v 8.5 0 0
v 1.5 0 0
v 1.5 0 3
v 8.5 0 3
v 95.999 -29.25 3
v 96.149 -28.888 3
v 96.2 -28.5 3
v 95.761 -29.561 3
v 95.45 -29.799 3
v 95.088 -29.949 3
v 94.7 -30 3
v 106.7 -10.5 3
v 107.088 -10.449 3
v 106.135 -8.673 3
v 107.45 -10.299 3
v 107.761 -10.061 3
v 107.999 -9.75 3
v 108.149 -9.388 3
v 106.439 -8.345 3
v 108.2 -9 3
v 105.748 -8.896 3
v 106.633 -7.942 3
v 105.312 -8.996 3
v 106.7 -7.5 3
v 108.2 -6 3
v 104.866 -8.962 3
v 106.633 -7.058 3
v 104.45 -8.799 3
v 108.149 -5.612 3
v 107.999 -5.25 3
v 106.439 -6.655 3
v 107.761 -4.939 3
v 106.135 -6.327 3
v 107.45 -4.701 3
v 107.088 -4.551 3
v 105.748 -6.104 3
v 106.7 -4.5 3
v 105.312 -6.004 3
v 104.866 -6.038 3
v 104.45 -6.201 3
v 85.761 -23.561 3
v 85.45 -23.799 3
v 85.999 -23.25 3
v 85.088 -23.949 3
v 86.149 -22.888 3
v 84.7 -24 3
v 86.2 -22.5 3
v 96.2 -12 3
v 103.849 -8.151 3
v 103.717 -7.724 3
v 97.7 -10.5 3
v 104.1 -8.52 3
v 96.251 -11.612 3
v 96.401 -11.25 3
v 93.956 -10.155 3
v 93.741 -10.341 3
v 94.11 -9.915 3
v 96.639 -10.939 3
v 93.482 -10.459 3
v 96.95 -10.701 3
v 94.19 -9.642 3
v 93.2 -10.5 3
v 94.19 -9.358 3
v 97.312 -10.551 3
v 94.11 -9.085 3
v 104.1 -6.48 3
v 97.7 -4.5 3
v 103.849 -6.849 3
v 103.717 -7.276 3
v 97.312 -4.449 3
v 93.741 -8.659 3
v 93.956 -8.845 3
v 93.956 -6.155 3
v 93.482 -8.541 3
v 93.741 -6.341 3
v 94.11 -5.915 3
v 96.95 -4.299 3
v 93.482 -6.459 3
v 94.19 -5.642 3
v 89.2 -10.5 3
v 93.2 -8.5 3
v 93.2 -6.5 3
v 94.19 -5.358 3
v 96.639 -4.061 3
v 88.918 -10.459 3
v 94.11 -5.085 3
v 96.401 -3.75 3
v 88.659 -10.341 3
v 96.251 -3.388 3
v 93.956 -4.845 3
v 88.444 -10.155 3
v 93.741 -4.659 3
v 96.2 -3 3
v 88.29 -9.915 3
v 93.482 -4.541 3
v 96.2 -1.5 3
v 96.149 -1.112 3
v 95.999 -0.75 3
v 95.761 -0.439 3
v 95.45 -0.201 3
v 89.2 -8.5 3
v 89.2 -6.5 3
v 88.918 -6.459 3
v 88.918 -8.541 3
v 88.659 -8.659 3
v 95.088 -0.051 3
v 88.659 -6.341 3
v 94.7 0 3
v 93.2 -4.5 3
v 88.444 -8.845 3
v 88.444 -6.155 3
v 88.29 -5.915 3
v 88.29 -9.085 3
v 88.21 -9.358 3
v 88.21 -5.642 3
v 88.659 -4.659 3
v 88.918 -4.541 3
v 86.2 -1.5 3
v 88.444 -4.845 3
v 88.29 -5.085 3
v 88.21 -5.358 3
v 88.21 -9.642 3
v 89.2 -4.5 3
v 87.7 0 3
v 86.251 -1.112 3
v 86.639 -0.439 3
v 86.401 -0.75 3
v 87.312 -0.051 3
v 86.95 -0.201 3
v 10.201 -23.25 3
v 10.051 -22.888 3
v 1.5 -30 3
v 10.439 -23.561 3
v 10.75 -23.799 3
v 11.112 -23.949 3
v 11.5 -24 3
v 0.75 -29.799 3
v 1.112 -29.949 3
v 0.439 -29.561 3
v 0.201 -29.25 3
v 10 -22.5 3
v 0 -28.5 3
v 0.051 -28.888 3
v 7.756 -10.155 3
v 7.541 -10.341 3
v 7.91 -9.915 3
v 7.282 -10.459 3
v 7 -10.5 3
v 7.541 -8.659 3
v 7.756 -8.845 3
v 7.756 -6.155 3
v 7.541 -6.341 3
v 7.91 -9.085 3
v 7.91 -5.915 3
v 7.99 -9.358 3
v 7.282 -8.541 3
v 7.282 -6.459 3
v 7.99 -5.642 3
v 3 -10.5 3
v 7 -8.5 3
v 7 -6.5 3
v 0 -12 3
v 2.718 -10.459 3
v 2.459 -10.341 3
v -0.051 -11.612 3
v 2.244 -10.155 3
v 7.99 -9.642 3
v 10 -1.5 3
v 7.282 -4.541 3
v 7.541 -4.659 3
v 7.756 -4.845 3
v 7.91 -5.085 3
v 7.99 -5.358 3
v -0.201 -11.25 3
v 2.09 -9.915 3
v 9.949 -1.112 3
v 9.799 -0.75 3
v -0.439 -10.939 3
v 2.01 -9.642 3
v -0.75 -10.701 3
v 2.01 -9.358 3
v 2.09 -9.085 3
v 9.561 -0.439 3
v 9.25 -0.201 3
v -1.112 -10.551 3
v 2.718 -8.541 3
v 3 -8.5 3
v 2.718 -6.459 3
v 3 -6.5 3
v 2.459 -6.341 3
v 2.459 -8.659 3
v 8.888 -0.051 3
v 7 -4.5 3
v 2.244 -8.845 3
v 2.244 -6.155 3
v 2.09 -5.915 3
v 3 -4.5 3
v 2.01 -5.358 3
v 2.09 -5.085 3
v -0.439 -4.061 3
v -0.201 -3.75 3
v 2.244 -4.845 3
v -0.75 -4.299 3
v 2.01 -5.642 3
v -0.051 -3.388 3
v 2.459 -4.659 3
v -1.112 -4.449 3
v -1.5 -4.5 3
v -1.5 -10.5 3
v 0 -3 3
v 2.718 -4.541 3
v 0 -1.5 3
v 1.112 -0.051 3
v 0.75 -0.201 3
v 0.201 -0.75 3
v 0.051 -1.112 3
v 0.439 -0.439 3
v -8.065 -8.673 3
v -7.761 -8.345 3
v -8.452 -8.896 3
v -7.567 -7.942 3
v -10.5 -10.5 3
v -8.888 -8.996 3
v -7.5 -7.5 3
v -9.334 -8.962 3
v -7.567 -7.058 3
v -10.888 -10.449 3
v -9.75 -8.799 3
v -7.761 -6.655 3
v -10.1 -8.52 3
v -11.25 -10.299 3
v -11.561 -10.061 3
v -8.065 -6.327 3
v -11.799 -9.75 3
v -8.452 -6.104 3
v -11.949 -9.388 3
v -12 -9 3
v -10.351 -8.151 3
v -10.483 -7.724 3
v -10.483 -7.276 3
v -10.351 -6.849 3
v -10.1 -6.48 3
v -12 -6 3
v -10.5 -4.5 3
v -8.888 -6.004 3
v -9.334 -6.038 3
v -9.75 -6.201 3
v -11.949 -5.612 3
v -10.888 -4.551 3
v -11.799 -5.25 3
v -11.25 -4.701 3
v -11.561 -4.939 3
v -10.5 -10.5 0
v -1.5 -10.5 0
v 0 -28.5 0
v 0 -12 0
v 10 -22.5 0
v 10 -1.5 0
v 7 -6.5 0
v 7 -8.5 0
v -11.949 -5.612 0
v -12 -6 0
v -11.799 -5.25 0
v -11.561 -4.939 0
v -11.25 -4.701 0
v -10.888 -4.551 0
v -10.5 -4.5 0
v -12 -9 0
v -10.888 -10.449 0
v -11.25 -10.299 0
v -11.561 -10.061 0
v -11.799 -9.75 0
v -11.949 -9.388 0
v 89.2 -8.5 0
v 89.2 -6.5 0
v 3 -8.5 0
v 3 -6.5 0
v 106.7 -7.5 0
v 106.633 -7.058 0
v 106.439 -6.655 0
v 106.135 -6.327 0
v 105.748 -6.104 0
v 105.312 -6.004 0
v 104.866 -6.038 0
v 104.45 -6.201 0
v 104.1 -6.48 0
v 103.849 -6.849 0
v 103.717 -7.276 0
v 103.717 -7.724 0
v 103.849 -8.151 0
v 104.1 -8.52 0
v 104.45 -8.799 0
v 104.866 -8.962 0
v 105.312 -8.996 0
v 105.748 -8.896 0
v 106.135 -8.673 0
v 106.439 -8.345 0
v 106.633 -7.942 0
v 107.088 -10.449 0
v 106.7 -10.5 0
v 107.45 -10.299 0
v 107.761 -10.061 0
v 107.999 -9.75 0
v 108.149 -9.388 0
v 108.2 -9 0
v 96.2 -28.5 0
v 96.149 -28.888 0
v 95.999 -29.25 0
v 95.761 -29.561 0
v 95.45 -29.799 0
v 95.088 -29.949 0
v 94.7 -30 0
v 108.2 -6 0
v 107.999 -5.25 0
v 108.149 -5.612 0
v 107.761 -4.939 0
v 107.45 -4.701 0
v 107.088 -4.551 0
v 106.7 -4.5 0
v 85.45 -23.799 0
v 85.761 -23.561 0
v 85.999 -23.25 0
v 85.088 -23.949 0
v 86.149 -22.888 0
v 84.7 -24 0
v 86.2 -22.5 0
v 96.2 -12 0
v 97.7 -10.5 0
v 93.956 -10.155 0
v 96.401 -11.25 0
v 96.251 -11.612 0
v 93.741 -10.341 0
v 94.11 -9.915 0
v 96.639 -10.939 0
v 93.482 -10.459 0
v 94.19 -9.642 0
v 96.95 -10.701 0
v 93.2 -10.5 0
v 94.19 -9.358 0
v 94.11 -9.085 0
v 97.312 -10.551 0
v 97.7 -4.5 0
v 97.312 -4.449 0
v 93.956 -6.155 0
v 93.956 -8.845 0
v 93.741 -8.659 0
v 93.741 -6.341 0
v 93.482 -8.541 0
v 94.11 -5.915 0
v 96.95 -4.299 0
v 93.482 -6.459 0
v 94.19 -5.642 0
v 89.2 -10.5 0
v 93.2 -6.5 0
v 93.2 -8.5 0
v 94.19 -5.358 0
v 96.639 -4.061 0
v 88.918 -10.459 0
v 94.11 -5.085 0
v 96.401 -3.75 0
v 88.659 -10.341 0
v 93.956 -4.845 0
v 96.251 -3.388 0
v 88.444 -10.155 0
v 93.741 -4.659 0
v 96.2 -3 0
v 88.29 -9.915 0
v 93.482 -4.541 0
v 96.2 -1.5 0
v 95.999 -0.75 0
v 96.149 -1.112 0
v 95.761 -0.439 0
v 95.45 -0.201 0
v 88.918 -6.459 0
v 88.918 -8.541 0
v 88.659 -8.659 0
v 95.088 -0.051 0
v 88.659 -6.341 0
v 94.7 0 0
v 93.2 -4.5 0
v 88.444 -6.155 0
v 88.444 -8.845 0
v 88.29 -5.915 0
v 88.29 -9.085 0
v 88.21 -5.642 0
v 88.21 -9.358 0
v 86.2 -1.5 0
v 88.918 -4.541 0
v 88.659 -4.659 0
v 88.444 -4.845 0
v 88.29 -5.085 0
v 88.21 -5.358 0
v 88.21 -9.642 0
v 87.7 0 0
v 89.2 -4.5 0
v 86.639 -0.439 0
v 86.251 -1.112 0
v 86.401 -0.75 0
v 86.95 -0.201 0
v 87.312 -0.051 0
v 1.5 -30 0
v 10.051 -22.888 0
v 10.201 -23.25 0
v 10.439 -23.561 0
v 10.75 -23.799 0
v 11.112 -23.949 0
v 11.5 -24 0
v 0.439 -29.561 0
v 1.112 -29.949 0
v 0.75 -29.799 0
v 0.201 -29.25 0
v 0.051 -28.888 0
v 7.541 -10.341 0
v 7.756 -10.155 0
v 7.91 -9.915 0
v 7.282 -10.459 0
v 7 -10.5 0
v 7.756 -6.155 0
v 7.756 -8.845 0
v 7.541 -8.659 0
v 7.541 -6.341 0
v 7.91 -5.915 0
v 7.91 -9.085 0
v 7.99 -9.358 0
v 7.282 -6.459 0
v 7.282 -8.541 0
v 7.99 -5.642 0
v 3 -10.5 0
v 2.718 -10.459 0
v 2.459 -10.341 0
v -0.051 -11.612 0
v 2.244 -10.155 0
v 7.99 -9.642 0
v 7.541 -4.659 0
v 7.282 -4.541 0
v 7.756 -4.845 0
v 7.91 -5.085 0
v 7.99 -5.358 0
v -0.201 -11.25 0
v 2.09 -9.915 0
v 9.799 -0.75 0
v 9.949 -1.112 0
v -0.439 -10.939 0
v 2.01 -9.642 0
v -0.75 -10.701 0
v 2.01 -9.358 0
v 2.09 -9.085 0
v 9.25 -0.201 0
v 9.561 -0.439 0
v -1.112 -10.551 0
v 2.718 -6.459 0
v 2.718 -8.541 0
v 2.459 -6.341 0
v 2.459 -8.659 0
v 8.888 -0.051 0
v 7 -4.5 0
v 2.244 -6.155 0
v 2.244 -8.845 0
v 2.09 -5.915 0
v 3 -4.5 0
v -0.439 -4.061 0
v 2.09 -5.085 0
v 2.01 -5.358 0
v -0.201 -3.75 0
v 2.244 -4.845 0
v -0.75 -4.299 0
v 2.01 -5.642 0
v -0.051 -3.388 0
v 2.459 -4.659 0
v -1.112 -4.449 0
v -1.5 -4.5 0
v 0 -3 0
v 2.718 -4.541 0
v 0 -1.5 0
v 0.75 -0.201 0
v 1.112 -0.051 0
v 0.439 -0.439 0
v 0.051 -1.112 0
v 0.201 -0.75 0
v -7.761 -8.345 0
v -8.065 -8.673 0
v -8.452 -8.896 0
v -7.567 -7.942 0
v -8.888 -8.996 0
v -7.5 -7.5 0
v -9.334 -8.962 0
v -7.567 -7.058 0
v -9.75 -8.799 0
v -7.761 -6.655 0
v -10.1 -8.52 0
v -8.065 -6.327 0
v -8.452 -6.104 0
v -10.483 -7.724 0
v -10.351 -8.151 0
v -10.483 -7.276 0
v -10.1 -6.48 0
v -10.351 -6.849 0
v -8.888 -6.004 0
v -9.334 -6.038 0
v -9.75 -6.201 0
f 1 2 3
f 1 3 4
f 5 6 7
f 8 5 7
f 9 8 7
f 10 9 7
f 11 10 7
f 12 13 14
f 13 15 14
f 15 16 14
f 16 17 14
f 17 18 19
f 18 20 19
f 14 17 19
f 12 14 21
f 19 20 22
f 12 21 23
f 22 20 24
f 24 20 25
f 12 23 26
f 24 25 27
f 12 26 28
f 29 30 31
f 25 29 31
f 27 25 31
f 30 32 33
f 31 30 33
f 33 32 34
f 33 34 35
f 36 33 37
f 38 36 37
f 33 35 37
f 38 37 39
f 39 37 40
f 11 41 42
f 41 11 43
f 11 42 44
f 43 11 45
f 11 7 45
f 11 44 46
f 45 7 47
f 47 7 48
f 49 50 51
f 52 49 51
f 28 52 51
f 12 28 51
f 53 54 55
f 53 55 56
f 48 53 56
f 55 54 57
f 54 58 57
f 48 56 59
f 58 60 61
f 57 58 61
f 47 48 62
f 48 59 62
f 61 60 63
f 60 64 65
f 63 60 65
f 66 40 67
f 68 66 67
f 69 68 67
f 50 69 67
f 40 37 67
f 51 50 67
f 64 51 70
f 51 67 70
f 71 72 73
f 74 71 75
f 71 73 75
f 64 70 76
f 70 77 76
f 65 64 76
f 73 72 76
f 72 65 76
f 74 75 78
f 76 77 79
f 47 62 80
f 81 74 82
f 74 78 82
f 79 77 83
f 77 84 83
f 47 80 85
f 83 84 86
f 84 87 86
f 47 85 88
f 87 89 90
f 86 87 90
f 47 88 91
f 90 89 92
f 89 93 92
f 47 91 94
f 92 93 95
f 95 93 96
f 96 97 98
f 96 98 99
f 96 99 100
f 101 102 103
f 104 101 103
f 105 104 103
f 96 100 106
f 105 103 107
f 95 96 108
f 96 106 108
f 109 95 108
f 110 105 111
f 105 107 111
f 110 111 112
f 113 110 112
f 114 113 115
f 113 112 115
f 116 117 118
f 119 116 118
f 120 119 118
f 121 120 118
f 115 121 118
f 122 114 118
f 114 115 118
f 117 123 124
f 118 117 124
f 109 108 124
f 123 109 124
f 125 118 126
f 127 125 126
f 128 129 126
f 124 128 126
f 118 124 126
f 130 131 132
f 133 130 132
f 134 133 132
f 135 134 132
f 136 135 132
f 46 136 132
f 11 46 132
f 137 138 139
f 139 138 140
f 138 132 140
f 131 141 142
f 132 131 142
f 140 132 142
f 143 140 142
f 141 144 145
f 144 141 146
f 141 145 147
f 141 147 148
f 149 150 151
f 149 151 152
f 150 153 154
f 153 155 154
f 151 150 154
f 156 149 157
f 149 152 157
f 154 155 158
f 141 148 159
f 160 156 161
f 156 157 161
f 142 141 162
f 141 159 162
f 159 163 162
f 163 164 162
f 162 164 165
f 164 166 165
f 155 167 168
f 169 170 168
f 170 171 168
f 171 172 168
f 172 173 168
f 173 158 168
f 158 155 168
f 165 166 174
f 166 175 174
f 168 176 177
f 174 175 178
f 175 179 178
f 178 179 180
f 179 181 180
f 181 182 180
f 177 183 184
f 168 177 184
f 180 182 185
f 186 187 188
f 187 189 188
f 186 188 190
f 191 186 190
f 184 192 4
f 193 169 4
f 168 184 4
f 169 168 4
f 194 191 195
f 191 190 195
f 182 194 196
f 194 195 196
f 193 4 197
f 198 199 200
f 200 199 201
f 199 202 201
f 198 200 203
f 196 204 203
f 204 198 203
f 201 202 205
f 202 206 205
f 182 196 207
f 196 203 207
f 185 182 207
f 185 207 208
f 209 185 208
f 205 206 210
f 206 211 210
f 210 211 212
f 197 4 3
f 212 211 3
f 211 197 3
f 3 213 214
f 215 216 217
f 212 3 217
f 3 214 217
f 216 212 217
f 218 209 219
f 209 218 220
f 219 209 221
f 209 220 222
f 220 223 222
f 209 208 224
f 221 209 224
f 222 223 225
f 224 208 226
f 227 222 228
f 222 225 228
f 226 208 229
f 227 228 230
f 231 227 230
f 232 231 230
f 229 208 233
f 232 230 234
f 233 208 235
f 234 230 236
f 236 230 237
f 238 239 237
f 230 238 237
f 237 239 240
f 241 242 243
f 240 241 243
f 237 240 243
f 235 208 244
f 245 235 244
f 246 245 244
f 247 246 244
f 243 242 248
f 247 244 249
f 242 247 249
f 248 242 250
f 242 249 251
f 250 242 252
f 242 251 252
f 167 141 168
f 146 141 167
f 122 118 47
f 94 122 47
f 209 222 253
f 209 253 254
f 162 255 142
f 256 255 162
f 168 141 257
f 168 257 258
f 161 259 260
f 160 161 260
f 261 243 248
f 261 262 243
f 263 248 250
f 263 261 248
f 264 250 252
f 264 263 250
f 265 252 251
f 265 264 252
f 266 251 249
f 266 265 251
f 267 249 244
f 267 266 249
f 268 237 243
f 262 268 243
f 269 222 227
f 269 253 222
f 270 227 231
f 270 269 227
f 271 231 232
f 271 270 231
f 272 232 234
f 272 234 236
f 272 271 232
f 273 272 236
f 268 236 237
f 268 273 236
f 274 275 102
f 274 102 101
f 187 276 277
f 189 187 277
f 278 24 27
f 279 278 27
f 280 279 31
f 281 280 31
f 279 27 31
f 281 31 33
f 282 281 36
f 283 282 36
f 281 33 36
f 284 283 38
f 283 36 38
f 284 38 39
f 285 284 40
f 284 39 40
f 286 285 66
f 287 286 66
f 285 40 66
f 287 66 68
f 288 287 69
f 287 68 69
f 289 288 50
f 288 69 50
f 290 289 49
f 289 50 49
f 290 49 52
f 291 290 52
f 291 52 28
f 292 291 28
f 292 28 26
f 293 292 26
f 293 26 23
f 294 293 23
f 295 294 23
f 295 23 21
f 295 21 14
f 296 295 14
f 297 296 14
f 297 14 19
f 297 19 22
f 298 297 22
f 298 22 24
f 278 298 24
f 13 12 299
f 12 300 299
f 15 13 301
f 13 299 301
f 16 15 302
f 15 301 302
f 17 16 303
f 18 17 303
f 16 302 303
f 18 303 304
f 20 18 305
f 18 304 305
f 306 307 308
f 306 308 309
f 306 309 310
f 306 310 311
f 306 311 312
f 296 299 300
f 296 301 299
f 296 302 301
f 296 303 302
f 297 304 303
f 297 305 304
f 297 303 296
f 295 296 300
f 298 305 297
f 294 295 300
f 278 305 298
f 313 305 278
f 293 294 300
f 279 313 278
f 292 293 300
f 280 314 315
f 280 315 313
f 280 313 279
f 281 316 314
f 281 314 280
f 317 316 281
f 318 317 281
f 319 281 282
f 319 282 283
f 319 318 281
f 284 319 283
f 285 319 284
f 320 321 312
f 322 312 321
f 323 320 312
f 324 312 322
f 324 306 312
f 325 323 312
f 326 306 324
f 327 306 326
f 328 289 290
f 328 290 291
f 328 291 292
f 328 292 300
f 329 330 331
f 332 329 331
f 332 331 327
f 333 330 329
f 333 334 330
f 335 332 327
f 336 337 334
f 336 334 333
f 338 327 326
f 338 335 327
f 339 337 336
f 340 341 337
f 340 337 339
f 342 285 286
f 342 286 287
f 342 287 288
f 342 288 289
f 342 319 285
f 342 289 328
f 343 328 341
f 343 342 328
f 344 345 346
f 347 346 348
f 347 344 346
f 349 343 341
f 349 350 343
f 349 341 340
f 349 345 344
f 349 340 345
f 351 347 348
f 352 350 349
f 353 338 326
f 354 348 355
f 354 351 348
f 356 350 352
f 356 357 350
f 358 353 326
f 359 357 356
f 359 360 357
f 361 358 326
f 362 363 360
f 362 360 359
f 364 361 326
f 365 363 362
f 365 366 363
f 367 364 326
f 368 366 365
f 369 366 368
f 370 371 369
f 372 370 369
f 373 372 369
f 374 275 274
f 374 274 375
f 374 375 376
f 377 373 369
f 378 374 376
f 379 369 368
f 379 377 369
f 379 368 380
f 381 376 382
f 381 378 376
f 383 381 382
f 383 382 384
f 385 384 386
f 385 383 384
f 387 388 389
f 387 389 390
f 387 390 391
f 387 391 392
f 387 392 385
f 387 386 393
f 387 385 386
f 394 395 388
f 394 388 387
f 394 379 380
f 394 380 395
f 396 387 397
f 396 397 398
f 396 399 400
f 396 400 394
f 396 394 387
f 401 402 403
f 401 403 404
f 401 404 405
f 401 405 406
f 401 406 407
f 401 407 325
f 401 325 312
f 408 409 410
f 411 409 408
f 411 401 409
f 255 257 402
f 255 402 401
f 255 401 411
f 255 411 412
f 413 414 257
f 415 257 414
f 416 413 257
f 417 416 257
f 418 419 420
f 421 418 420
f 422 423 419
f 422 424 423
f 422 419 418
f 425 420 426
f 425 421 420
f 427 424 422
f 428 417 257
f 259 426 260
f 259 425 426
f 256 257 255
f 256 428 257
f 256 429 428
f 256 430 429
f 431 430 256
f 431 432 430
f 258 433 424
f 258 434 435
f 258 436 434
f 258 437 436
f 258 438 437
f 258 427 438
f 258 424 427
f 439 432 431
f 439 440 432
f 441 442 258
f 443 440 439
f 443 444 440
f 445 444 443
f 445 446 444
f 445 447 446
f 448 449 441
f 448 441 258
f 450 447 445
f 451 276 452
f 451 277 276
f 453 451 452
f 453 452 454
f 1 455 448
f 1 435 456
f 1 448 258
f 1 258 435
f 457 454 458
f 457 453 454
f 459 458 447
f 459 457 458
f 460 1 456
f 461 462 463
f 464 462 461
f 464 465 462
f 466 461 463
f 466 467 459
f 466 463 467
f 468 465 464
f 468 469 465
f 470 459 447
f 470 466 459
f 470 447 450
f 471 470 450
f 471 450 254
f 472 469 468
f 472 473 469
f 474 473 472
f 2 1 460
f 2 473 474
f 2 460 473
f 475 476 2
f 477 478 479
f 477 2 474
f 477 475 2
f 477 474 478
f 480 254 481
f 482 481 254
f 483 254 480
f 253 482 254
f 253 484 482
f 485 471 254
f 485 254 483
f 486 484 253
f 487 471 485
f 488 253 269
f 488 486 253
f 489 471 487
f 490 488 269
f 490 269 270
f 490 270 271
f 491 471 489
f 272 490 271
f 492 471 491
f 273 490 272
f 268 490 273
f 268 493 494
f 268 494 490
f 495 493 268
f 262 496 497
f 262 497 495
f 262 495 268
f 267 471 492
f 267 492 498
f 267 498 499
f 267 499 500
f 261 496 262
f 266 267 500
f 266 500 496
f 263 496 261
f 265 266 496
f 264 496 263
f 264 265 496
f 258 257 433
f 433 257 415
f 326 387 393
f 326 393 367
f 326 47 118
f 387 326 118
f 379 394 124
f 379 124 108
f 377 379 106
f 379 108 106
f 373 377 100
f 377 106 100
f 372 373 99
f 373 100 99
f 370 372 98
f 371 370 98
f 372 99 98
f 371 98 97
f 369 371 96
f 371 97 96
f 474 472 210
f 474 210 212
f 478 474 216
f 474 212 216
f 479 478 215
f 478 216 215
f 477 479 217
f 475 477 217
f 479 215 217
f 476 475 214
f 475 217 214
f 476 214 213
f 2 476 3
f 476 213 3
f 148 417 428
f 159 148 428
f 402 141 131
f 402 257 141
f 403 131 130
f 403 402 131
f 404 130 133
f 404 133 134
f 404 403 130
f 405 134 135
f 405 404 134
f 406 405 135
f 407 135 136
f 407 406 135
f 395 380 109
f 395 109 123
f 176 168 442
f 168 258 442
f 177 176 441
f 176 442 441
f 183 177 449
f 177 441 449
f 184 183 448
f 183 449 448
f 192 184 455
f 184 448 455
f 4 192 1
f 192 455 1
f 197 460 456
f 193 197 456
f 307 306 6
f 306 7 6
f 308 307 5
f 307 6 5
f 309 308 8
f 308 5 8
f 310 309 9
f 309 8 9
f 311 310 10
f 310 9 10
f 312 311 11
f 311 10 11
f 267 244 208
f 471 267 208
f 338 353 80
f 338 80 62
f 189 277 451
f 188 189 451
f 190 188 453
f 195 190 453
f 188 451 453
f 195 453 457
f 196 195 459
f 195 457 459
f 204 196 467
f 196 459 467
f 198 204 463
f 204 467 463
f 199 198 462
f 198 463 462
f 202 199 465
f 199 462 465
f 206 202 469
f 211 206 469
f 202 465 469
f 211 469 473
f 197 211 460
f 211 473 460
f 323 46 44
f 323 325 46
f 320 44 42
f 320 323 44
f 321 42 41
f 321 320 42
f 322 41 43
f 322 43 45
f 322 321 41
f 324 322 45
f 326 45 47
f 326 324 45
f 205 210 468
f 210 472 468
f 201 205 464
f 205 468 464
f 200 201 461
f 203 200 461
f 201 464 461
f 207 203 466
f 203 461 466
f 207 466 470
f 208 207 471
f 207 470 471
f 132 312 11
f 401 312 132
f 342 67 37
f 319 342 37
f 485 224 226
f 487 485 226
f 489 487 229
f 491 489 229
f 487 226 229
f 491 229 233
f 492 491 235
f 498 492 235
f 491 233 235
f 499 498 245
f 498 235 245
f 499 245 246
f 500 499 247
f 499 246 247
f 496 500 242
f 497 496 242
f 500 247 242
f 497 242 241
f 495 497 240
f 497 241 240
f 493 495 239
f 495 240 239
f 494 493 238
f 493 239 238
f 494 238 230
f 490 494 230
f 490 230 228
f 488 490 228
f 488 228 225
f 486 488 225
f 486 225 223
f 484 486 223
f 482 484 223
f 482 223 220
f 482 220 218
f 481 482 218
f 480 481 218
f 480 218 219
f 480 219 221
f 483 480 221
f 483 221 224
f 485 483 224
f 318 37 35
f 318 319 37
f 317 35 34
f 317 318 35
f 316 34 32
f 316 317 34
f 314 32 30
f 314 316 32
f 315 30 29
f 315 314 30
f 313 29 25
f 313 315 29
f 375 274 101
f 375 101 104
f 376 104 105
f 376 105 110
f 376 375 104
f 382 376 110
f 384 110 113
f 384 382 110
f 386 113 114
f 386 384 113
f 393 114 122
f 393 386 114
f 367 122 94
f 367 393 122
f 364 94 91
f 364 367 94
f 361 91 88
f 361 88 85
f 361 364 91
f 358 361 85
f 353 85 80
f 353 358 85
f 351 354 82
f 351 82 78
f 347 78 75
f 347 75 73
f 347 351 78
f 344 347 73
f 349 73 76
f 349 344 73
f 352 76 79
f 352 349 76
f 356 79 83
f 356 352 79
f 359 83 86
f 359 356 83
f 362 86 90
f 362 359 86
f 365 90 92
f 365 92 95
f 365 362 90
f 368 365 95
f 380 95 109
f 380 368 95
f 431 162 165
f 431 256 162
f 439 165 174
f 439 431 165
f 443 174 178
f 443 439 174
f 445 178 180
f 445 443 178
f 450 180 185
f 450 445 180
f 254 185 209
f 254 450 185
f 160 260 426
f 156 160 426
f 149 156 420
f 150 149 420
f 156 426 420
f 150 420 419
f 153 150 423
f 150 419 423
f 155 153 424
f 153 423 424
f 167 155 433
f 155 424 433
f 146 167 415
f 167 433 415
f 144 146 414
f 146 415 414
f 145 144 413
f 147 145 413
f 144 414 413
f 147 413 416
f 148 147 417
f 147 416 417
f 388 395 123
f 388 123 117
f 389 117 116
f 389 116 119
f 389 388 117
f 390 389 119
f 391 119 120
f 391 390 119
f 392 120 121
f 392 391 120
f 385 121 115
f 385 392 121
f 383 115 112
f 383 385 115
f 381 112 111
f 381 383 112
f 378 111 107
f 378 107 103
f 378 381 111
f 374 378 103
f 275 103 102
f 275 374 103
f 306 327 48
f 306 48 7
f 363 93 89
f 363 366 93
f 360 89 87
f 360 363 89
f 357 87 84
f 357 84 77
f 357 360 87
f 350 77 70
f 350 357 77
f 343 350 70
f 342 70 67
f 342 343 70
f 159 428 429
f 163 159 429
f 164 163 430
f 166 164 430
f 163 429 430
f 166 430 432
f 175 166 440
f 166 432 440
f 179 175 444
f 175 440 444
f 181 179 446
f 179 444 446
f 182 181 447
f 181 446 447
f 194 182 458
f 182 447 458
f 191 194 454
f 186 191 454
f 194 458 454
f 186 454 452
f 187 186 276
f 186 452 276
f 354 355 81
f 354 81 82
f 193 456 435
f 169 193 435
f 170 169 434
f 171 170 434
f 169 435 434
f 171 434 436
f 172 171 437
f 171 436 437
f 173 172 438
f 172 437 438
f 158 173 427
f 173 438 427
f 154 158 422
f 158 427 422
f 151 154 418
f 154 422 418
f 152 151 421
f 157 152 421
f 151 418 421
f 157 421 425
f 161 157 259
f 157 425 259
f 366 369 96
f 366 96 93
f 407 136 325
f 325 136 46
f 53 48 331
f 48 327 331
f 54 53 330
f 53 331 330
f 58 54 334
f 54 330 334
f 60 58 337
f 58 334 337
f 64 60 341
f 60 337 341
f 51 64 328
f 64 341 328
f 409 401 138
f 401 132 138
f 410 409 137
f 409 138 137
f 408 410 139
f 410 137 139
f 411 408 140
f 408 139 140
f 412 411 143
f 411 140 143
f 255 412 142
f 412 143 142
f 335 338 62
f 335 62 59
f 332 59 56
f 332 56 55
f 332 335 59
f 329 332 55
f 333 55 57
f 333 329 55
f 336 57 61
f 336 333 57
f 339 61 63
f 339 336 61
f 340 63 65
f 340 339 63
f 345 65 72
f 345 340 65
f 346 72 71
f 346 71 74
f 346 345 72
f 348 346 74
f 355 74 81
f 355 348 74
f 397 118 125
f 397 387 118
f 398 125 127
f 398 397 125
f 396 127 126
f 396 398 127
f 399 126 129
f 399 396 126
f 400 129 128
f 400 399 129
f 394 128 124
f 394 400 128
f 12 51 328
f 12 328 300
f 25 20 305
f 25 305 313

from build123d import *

# Parameters (mm, degrees)
EXTRUDE_1_DEPTH     = 3
SKETCH_2_W          = 8
SKETCH_2_H          = 4.5
SKETCH_2_H_2        = 13.5
CUT_EXTRUDE_1_DEPTH = 3
SKETCH_4_W          = 76.2
SKETCH_4_H          = 6
CUT_EXTRUDE_2_DEPTH = 3
SKETCH_6_W          = 12
SKETCH_6_H          = 6
EXTRUDE_2_DEPTH     = 3
FILLET_1_R          = 1.5
SKETCH_7_R          = 1.5
CUT_EXTRUDE_3_DEPTH = 10


with BuildPart() as part:
    # 草图1 → 凸台-拉伸1 (new body)
    with BuildSketch(Plane.XY):
        Polygon((18, 0), (18, -24), (78.2, -24), (78.2, 0), (96.2, 0), (96.2, -30), (0, -30), (0, 0), align=None)
        with BuildLine():
            Line((3, -4.5), (7, -4.5))
            ThreePointArc((7, -4.5), (8, -5.5), (7, -6.5))
            Line((7, -6.5), (7, -8.5))
            ThreePointArc((7, -8.5), (8, -9.5), (7, -10.5))
            Line((7, -10.5), (3, -10.5))
            ThreePointArc((3, -10.5), (2, -9.5), (3, -8.5))
            Line((3, -8.5), (3, -6.5))
            ThreePointArc((3, -6.5), (2, -5.5), (3, -4.5))
        make_face(mode=Mode.SUBTRACT)
        with BuildLine():
            Line((89.2, -6.5), (89.2, -8.5))
            ThreePointArc((89.2, -8.5), (88.2, -9.5), (89.2, -10.5))
            Line((89.2, -10.5), (93.2, -10.5))
            ThreePointArc((93.2, -10.5), (94.2, -9.5), (93.2, -8.5))
            Line((93.2, -8.5), (93.2, -6.5))
            ThreePointArc((93.2, -6.5), (94.2, -5.5), (93.2, -4.5))
            Line((93.2, -4.5), (89.2, -4.5))
            ThreePointArc((89.2, -4.5), (88.2, -5.5), (89.2, -6.5))
        make_face(mode=Mode.SUBTRACT)
    extrude(amount=EXTRUDE_1_DEPTH)

    # 草图2 → 切除-拉伸1 (cut)
    with BuildSketch(Plane.XY.offset(3)):
        with Locations((14, -2.25)):
            Rectangle(SKETCH_2_W, SKETCH_2_H)
        with Locations((14, -17.25)):
            Rectangle(SKETCH_2_W, SKETCH_2_H_2)
        with Locations((82.2, -17.25)):
            Rectangle(SKETCH_2_W, SKETCH_2_H_2)
        with Locations((82.2, -2.25)):
            Rectangle(SKETCH_2_W, SKETCH_2_H)
    extrude(amount=-CUT_EXTRUDE_1_DEPTH, mode=Mode.SUBTRACT)

    # 草图4 → 切除-拉伸2 (cut)
    with BuildSketch(Plane.XY.offset(3)):
        with Locations((48.1, -7.5)):
            Rectangle(SKETCH_4_W, SKETCH_4_H)
    extrude(amount=-CUT_EXTRUDE_2_DEPTH, mode=Mode.SUBTRACT)

    # 草图6 → 凸台-拉伸2 (add)
    with BuildSketch(Plane.XY.offset(3)):
        with Locations((102.2, -7.5)):
            Rectangle(SKETCH_6_W, SKETCH_6_H)
        with Locations((-6, -7.5)):
            Rectangle(SKETCH_6_W, SKETCH_6_H)
    extrude(amount=-EXTRUDE_2_DEPTH)

    # 圆角1
    fillet_1_edges = [part.edges().sort_by_distance(p)[0] for p in [
        (10, -24, 1.5),
        (10, 0, 1.5),
        (0, 0, 1.5),
        (96.2, 0, 1.5),
        (96.2, -30, 1.5),
        (0, -30, 1.5),
        (96.2, -10.5, 1.5),
        (96.2, -4.5, 1.5),
        (108.2, -4.5, 1.5),
        (108.2, -10.5, 1.5),
        (-12, -4.5, 1.5),
        (0, -4.5, 1.5),
        (0, -10.5, 1.5),
        (-12, -10.5, 1.5),
        (86.2, 0, 1.5),
        (86.2, -24, 1.5),
    ]]
    fillet(fillet_1_edges, radius=FILLET_1_R)

    # 草图7 → 切除-拉伸3 (cut)
    with BuildSketch(Plane.XY.offset(3)):
        with Locations((-9, -7.5)):
            Circle(SKETCH_7_R)
        with Locations((105.2, -7.5)):
            Circle(SKETCH_7_R)
    extrude(amount=-CUT_EXTRUDE_3_DEPTH, mode=Mode.SUBTRACT)


solid = part.part
